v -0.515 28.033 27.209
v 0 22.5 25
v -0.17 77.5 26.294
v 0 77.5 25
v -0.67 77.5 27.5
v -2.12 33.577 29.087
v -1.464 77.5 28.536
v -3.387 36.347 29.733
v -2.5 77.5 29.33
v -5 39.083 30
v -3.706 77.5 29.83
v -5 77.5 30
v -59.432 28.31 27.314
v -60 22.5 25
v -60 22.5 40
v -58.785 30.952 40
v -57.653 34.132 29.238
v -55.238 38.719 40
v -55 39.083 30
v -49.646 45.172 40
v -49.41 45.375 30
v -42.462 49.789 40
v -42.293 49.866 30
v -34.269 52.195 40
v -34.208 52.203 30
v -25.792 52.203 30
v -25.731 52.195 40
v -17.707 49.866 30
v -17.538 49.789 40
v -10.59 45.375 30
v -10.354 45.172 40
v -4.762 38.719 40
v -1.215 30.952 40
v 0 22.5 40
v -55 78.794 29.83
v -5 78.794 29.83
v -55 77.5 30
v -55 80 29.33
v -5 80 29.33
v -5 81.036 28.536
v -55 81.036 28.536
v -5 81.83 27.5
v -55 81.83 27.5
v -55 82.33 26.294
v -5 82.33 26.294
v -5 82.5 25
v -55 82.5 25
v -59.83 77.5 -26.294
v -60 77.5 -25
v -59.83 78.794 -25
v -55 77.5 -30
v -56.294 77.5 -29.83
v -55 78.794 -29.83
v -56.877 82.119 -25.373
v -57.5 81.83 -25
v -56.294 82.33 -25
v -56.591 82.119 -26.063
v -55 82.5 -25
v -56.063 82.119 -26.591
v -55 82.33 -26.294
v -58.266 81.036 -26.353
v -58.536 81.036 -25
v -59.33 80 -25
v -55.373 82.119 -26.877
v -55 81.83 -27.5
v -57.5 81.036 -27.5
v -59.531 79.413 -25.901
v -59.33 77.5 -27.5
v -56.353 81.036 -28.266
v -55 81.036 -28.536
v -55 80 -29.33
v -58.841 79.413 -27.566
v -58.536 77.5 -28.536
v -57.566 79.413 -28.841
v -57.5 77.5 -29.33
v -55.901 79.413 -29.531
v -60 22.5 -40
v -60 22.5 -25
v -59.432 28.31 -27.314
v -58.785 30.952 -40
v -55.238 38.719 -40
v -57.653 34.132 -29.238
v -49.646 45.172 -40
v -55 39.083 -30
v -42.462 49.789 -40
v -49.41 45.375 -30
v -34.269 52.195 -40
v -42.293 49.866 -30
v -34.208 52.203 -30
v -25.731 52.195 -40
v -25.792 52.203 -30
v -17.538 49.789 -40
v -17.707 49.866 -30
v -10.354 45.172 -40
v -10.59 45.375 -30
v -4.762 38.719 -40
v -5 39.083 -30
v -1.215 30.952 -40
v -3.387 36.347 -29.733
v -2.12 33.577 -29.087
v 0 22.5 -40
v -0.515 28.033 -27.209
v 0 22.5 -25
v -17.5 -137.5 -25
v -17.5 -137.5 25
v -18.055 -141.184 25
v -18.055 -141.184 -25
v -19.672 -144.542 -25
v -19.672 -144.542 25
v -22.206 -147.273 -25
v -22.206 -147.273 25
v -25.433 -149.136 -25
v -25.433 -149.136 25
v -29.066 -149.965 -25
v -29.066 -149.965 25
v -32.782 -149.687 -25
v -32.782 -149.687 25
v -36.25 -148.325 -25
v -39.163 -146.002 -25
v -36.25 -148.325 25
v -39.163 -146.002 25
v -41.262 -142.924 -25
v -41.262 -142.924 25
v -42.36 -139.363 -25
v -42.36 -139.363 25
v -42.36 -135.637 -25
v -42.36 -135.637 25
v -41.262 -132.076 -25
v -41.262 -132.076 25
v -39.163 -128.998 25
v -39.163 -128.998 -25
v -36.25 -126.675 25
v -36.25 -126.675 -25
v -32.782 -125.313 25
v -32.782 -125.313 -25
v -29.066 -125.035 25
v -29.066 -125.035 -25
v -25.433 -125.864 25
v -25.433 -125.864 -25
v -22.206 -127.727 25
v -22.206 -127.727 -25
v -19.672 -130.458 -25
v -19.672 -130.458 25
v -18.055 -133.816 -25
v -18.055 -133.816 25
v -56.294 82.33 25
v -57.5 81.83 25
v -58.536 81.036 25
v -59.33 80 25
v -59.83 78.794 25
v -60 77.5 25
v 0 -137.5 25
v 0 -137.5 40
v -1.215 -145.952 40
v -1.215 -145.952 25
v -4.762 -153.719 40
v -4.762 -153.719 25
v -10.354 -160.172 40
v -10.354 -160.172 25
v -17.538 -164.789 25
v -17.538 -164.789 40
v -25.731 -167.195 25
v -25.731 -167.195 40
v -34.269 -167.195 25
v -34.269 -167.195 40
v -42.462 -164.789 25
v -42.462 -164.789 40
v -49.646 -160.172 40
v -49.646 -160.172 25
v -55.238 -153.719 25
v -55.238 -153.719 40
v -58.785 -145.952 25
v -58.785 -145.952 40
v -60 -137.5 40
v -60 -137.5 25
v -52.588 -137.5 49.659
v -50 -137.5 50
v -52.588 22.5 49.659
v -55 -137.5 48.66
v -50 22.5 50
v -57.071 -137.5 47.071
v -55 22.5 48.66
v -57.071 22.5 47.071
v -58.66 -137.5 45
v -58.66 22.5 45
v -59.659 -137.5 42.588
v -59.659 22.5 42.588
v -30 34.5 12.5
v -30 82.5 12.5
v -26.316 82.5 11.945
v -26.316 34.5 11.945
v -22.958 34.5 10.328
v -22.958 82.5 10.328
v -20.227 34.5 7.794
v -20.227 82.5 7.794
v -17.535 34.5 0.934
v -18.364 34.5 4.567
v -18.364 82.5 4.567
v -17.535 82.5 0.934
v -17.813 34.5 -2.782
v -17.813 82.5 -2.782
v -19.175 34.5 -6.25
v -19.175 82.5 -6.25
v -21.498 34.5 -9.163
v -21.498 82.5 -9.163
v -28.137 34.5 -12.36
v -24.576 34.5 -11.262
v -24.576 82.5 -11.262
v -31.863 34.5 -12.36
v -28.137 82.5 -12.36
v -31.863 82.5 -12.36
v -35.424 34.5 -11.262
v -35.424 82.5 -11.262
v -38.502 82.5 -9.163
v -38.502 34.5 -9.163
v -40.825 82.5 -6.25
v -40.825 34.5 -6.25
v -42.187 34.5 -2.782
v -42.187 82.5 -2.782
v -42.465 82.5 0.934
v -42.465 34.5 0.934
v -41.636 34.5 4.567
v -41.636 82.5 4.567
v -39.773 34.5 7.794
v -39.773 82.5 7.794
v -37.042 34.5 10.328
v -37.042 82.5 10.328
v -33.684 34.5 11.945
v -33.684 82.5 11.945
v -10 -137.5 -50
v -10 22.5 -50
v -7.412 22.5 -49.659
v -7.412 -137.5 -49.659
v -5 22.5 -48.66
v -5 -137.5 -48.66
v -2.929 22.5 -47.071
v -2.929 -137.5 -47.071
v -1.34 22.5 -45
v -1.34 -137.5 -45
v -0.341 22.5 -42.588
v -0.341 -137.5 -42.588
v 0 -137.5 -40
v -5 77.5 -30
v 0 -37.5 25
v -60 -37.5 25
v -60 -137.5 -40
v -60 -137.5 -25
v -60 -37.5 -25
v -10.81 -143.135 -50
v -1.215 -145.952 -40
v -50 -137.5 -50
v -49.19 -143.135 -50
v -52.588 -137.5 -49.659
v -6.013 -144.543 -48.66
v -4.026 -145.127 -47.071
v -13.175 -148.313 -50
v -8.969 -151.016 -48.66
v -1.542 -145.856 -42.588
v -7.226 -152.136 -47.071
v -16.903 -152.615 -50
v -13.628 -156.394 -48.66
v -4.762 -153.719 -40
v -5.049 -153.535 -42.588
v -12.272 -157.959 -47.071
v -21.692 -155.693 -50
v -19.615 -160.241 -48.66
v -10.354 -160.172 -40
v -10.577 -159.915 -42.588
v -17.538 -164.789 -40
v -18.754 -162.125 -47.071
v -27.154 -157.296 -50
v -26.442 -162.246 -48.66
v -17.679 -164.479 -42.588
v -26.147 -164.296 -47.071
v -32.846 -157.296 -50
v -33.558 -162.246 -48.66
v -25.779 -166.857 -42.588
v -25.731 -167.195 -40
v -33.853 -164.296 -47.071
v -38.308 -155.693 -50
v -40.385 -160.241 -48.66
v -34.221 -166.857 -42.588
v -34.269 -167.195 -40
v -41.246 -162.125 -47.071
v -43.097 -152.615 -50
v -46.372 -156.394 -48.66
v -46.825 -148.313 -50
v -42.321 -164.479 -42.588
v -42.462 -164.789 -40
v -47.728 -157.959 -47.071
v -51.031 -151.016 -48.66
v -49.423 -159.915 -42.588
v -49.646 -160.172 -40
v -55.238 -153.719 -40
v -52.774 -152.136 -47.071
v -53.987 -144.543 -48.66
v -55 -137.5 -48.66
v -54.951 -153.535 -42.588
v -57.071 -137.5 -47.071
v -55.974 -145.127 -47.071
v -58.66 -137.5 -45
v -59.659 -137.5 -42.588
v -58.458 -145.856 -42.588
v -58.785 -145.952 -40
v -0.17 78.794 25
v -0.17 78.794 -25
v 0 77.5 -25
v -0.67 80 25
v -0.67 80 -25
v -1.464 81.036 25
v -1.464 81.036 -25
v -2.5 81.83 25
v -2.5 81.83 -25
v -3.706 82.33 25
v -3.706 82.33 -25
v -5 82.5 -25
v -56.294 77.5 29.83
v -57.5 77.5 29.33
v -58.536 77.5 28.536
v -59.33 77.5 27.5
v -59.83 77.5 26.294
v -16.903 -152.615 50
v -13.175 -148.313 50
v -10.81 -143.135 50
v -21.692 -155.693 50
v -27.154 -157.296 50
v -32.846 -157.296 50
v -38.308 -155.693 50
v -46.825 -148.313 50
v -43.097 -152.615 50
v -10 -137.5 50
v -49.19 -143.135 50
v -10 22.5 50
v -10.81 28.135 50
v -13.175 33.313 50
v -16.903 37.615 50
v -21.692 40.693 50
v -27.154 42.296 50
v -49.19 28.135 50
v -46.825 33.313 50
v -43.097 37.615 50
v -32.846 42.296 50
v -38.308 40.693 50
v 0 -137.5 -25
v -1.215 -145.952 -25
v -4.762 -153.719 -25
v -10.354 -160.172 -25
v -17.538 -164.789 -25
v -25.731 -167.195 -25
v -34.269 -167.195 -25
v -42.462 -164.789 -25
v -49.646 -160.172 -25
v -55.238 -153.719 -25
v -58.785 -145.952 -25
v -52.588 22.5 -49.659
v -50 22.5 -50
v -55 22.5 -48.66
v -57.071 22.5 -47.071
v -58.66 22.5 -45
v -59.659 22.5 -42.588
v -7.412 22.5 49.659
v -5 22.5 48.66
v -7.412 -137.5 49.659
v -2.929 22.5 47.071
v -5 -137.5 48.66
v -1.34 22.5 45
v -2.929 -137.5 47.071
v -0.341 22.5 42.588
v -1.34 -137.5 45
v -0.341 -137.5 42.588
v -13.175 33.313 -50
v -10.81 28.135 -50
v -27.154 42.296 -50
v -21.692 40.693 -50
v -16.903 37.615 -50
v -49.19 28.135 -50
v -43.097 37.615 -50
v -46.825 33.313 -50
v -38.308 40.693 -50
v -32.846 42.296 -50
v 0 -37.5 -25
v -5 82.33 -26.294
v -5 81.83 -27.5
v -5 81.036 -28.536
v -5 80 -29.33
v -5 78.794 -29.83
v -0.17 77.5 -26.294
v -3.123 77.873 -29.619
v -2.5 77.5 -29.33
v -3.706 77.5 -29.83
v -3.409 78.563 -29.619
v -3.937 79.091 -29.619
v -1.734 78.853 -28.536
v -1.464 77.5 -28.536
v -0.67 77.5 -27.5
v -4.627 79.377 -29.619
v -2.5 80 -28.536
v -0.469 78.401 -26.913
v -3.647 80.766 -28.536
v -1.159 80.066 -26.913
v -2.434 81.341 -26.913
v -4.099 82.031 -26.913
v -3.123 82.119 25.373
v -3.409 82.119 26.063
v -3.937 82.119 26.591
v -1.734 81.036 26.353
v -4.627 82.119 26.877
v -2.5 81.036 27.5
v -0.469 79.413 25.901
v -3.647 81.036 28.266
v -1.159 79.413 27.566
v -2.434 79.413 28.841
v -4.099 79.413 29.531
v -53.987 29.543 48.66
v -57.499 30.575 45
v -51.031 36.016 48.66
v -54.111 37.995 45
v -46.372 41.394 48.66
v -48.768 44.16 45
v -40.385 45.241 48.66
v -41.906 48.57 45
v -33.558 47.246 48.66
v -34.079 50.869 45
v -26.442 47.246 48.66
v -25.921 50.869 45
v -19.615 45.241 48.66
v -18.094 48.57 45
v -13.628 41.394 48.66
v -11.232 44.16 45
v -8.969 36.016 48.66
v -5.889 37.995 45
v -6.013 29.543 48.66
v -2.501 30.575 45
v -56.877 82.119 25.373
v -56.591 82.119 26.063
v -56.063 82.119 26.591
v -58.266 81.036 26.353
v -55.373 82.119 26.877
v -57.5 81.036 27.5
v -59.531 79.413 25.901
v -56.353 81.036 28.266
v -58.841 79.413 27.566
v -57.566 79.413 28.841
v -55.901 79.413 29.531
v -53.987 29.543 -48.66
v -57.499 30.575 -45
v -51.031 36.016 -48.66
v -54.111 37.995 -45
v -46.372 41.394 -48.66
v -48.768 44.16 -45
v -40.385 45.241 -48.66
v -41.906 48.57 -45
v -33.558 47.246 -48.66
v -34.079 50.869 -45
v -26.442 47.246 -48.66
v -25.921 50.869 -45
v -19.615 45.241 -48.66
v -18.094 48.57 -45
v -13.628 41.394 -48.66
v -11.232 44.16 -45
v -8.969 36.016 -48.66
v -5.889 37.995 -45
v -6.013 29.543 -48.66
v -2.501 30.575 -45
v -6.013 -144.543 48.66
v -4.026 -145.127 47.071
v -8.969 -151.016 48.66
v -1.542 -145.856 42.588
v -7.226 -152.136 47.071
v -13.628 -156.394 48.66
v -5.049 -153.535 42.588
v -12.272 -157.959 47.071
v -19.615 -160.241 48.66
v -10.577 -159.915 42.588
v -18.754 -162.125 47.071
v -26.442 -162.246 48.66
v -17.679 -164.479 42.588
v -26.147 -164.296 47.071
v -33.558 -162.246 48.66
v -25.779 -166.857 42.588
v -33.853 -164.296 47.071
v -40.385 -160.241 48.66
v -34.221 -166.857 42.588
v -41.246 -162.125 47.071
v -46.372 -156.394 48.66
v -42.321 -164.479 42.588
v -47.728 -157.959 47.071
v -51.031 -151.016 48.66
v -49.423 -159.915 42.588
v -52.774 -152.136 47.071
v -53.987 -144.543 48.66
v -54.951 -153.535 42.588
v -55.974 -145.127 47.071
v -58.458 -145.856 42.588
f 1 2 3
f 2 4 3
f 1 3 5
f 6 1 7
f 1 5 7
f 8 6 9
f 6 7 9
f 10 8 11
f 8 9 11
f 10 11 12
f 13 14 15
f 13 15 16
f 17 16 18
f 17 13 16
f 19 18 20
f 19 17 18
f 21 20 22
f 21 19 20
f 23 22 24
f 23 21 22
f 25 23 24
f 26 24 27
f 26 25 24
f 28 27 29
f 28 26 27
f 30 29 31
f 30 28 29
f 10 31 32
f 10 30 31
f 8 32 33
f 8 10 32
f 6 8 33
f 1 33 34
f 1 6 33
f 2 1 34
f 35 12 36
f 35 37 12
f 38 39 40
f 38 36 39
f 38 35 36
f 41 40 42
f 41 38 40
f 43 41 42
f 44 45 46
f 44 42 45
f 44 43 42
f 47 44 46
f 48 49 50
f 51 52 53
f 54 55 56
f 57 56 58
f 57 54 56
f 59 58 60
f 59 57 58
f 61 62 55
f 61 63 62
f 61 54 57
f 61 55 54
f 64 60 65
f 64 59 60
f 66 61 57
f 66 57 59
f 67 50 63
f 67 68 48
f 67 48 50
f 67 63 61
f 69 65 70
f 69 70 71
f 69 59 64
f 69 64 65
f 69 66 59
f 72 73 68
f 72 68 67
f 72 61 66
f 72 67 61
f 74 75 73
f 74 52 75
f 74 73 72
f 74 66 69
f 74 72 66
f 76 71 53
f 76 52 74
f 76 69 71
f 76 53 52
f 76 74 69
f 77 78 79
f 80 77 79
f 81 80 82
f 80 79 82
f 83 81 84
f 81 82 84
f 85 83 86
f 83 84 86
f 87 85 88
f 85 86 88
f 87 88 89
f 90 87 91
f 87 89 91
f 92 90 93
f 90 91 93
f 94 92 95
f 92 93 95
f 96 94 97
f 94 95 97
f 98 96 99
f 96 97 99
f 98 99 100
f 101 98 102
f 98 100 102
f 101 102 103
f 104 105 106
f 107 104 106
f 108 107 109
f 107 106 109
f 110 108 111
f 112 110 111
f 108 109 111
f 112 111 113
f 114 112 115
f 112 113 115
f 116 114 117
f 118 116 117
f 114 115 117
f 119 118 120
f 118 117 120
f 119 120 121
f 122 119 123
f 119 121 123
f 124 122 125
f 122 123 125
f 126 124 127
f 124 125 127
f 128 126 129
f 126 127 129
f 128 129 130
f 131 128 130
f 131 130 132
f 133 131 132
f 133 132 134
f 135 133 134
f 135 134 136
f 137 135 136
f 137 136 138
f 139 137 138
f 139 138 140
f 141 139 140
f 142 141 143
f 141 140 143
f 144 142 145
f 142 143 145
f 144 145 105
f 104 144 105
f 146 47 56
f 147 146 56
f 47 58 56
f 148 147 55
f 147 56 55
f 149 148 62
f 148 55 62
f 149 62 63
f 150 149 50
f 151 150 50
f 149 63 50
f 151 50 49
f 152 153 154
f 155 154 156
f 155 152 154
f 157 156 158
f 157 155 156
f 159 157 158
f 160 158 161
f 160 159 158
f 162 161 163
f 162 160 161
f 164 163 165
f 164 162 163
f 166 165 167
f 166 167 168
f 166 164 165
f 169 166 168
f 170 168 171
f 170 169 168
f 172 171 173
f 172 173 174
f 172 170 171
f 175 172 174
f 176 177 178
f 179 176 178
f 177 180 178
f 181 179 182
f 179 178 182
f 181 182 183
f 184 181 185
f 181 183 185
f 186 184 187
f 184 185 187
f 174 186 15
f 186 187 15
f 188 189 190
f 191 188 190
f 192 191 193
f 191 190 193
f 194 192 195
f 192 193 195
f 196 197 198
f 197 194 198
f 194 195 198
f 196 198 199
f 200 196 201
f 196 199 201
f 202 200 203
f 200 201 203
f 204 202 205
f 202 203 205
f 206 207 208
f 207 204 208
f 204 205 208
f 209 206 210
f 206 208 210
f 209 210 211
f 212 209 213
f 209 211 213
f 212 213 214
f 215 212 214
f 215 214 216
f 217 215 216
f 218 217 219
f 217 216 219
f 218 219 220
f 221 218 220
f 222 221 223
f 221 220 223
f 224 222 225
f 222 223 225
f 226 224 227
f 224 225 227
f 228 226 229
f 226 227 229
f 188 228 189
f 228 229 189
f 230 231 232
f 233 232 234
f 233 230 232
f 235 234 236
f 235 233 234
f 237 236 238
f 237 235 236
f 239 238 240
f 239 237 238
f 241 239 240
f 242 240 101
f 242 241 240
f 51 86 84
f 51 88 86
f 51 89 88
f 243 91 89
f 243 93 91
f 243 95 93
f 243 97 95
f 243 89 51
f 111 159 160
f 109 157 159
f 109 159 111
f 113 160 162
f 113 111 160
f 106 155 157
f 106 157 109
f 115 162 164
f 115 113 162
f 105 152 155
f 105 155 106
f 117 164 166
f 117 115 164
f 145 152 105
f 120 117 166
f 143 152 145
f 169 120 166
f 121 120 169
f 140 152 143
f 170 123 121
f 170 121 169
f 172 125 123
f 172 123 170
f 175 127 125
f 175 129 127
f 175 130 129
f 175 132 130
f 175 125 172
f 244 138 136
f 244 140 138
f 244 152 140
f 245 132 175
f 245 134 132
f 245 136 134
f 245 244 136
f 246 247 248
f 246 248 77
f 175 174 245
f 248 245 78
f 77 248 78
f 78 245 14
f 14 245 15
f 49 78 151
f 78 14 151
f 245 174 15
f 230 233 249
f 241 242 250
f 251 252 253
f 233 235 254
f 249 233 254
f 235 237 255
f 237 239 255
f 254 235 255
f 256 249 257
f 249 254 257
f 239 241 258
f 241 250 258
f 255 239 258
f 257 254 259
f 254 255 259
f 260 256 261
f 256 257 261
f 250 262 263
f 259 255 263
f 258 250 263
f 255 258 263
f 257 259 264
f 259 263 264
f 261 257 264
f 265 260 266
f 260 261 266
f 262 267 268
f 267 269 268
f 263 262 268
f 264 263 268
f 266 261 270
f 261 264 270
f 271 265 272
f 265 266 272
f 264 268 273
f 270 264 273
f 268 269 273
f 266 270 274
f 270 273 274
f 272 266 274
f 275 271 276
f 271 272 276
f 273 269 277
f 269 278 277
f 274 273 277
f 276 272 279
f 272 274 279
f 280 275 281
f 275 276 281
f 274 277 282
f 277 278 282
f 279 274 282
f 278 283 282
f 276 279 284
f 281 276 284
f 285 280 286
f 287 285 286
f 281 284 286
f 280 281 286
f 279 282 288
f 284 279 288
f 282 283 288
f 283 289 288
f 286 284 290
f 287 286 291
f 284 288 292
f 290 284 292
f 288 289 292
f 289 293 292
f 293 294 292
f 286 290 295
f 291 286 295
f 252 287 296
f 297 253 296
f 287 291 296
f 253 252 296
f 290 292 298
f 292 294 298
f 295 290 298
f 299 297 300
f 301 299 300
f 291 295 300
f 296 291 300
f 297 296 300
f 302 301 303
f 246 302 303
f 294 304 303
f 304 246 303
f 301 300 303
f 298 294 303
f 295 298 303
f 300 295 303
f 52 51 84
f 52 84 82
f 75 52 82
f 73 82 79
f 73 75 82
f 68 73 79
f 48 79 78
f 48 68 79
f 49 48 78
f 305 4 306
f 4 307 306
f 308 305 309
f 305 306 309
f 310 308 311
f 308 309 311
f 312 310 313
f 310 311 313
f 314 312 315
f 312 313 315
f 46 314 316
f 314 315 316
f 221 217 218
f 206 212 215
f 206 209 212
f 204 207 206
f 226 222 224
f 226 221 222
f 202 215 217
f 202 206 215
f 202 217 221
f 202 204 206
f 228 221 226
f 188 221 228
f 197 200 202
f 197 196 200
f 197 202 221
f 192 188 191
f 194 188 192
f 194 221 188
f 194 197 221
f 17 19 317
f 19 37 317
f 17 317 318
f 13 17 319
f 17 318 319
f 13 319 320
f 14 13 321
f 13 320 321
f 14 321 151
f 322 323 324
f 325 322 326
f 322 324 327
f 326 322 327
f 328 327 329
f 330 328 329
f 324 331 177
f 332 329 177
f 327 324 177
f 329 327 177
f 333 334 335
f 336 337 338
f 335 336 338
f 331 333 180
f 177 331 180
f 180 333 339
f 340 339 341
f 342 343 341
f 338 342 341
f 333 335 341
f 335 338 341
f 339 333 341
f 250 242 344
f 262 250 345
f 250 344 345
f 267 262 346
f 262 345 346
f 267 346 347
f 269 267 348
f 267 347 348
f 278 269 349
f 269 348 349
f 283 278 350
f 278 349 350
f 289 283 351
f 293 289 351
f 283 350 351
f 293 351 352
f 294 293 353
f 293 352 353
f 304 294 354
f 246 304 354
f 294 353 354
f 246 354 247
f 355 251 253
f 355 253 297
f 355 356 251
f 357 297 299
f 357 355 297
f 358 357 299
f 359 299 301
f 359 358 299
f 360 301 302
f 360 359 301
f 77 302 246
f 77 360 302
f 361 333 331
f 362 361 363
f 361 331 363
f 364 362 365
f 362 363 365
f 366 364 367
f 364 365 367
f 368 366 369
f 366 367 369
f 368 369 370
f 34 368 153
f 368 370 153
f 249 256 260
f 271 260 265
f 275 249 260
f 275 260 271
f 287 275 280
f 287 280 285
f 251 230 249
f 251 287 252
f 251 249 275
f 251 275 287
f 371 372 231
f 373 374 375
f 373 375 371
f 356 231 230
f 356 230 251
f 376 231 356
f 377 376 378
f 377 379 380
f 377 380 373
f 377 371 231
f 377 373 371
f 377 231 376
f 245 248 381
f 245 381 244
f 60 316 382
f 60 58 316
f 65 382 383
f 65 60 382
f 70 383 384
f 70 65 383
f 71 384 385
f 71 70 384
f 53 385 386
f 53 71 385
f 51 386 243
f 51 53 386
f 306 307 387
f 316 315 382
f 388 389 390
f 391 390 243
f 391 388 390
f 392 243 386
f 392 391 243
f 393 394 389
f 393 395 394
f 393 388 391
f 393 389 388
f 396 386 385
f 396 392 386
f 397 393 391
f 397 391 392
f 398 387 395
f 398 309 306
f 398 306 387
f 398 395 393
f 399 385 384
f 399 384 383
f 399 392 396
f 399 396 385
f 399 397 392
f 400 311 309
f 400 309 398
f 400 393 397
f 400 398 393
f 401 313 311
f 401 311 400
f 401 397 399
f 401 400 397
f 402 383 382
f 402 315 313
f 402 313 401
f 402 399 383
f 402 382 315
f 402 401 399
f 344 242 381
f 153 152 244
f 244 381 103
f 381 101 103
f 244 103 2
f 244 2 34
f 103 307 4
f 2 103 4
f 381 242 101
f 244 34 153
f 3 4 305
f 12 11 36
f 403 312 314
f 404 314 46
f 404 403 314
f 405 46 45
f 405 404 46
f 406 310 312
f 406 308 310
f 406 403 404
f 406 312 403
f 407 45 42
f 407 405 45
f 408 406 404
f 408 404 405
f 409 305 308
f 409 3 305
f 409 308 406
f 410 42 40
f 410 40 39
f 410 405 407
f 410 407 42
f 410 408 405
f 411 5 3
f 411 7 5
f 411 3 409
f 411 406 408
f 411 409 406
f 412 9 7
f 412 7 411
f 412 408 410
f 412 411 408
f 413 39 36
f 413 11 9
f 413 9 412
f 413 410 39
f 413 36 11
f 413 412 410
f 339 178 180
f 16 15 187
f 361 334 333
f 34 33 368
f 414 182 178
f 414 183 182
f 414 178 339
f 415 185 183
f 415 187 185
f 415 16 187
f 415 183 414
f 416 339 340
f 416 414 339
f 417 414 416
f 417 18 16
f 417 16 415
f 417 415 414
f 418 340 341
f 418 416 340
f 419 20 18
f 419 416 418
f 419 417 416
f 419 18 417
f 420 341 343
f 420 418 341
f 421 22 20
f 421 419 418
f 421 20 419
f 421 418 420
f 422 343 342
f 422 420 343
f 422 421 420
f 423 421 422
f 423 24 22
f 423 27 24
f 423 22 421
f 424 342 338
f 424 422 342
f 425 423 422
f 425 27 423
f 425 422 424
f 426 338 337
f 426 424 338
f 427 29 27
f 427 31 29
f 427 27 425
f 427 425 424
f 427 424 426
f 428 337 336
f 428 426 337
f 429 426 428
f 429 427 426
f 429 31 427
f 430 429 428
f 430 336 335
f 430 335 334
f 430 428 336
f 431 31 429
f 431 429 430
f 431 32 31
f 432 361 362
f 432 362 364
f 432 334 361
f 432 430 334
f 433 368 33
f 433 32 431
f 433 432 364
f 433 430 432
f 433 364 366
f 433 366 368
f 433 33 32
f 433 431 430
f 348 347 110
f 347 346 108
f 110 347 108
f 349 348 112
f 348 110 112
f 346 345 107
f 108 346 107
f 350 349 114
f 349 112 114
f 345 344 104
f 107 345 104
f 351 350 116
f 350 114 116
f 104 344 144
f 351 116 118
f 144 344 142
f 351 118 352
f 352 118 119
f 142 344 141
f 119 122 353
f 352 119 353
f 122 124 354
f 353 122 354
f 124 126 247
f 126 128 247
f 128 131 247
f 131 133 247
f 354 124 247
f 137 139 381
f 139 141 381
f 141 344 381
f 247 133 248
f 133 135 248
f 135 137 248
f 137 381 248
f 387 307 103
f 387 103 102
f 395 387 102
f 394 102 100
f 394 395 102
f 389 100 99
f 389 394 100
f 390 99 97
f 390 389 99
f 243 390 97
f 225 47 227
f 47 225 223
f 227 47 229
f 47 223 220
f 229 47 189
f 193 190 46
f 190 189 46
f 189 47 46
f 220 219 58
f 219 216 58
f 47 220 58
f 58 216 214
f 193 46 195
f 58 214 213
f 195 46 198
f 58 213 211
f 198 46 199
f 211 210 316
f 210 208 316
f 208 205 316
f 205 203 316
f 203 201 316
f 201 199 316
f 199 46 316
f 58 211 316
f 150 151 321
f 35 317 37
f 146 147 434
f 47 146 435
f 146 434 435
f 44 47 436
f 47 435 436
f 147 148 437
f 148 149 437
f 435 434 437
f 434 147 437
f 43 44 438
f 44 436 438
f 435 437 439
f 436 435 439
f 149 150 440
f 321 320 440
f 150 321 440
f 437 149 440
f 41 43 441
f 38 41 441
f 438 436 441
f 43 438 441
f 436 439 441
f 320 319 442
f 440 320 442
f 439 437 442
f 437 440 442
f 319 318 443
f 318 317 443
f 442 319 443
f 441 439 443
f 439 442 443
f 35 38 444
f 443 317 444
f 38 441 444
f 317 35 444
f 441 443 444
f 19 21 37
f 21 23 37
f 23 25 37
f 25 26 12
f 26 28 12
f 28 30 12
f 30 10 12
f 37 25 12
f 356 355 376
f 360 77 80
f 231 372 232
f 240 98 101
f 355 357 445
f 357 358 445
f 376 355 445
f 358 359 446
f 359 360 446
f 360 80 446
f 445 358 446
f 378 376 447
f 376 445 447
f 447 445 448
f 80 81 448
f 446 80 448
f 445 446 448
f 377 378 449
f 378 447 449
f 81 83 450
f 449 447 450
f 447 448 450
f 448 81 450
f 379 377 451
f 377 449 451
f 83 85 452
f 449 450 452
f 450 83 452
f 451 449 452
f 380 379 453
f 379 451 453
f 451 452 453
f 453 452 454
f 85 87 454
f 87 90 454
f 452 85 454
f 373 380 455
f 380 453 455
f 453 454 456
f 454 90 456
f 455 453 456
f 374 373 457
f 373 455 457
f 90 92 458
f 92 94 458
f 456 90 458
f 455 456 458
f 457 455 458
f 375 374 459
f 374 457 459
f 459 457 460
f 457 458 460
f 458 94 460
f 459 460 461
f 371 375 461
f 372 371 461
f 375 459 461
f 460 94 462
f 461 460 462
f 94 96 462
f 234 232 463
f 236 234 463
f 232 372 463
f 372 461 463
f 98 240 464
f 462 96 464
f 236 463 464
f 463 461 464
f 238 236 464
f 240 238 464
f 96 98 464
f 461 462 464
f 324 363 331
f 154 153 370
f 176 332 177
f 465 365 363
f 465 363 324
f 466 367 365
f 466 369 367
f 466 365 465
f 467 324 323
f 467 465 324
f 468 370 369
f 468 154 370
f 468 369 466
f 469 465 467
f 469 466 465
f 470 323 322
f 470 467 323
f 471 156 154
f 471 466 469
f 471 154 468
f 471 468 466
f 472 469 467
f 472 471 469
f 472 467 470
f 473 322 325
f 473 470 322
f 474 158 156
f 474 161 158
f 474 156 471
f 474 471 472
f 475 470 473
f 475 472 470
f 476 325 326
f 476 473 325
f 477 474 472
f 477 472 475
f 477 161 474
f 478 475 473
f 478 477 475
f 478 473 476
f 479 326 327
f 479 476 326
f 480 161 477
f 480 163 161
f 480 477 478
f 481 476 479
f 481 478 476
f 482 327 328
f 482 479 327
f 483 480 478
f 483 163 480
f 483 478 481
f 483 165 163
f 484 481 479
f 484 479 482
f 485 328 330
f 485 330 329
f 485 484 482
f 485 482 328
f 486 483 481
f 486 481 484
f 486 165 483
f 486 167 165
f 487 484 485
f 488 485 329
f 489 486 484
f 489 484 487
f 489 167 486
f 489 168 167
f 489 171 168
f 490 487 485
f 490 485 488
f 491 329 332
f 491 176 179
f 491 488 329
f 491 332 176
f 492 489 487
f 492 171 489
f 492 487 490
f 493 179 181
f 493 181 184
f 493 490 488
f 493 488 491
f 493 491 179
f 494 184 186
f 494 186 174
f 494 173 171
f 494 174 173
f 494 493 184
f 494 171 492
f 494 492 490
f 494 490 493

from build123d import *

# Parameters (mm, degrees)
SKETCH2_W                = 60
SKETCH2_H                = 120
BOSS_EXTRUDE1_DEPTH      = 60
SKETCH5_R                = 12.5
CUT_EXTRUDE2_DEPTH       = 48
BOSS_EXTRUDE3_DEPTH      = 20
BOSS_EXTRUDE3_DEPTH_BACK = 5
FILLET3_R                = 5
FILLET4_R                = 10
FILLET5_R                = 10
FILLET6_R                = 5
SKETCH7_R                = 12.5
BOSS_EXTRUDE4_DEPTH      = 50


with BuildPart() as part:
    # Sketch2 → Boss-Extrude1 (new body)
    with BuildSketch(Plane(origin=(0, 0, 0), x_dir=(0, 0, -1), z_dir=(1, 0, 0))):
        with Locations((0, 22.5)):
            Rectangle(SKETCH2_W, SKETCH2_H)
    extrude(amount=-BOSS_EXTRUDE1_DEPTH)

    # Sketch5 → Cut-Extrude2 (cut)
    with BuildSketch(Plane(origin=(0, 82.5, 0), x_dir=(1, 0, 0), z_dir=(0, 1, 0))):
        with Locations(Location((-30, 0, 0), (0, 0, 270))):
            Circle(SKETCH5_R)
    extrude(amount=-CUT_EXTRUDE2_DEPTH, mode=Mode.SUBTRACT)

    # Sketch6 → Boss-Extrude3 (add, two sides: drawn at the far end of the back side and taken through both)
    with BuildSketch(Plane.XY.offset(30).offset(-BOSS_EXTRUDE3_DEPTH_BACK)):
        with BuildLine():
            Line((0, 22.5), (0, -137.5))
            ThreePointArc((0, -137.5), (-30, -167.5), (-60, -137.5))
            Line((-60, -137.5), (-60, 22.5))
            ThreePointArc((-60, 22.5), (-30, 52.5), (0, 22.5))
        make_face()
    extrude(amount=BOSS_EXTRUDE3_DEPTH + BOSS_EXTRUDE3_DEPTH_BACK)

    # Fillet3
    fillet3_edges = [part.edges().sort_by_distance(p)[0] for p in [
        (-60, 52.5, 30),
        (-60, 22.5, -30),
        (0, 52.5, 30),
        (0, 82.5, 0),
        (0, 22.5, -30),
        (-60, 82.5, 0),
        (-30, 82.5, 30),
        (-30, 82.5, -30),
    ]]
    fillet(fillet3_edges, radius=FILLET3_R)


with BuildPart() as body_2:
    # Mirror2: mirrored copy
    add(part.part.mirror(Plane(origin=(0, 0, 0), x_dir=(1, 0, 0), z_dir=(0, 0, -1))))

    # Fillet5
    fillet5_edges = [body_2.edges().sort_by_distance(p)[0] for p in [
        (-30, 52.5, -50),
        (-60, -57.5, -50),
        (-30, -167.5, -50),
        (0, -57.5, -50),
    ]]
    fillet(fillet5_edges, radius=FILLET5_R)


with BuildPart() as part_1:
    add(part.part)

    # Fillet4
    fillet4_edges = [part_1.edges().sort_by_distance(p)[0] for p in [
        (-30, 52.5, 50),
        (-60, -57.5, 50),
        (-30, -167.5, 50),
        (0, -57.5, 50),
    ]]
    fillet(fillet4_edges, radius=FILLET4_R)

    # Fillet6
    fillet6_edges = [part_1.edges().sort_by_distance(p)[0] for p in [
        (0, -37.5, 0),
        (-60, -37.5, 0),
        (-30, -37.5, -30),
        (-58.535533906, -37.5, -28.535533906),
        (-1.464466094, -37.5, -28.535533906),
    ]]
    fillet(fillet6_edges, radius=FILLET6_R)

    add(body_2.part)  # Boss-Extrude4 merges body 2
    # Sketch7 → Boss-Extrude4 (add)
    with BuildSketch(Plane(origin=(0, 0, 25), x_dir=(-1, 0, 0), z_dir=(0, 0, -1))):
        with Locations(Location((30, -137.5, 0), (0, 0, 180))):
            Circle(SKETCH7_R)
    extrude(amount=BOSS_EXTRUDE4_DEPTH)


solid = part_1.part
